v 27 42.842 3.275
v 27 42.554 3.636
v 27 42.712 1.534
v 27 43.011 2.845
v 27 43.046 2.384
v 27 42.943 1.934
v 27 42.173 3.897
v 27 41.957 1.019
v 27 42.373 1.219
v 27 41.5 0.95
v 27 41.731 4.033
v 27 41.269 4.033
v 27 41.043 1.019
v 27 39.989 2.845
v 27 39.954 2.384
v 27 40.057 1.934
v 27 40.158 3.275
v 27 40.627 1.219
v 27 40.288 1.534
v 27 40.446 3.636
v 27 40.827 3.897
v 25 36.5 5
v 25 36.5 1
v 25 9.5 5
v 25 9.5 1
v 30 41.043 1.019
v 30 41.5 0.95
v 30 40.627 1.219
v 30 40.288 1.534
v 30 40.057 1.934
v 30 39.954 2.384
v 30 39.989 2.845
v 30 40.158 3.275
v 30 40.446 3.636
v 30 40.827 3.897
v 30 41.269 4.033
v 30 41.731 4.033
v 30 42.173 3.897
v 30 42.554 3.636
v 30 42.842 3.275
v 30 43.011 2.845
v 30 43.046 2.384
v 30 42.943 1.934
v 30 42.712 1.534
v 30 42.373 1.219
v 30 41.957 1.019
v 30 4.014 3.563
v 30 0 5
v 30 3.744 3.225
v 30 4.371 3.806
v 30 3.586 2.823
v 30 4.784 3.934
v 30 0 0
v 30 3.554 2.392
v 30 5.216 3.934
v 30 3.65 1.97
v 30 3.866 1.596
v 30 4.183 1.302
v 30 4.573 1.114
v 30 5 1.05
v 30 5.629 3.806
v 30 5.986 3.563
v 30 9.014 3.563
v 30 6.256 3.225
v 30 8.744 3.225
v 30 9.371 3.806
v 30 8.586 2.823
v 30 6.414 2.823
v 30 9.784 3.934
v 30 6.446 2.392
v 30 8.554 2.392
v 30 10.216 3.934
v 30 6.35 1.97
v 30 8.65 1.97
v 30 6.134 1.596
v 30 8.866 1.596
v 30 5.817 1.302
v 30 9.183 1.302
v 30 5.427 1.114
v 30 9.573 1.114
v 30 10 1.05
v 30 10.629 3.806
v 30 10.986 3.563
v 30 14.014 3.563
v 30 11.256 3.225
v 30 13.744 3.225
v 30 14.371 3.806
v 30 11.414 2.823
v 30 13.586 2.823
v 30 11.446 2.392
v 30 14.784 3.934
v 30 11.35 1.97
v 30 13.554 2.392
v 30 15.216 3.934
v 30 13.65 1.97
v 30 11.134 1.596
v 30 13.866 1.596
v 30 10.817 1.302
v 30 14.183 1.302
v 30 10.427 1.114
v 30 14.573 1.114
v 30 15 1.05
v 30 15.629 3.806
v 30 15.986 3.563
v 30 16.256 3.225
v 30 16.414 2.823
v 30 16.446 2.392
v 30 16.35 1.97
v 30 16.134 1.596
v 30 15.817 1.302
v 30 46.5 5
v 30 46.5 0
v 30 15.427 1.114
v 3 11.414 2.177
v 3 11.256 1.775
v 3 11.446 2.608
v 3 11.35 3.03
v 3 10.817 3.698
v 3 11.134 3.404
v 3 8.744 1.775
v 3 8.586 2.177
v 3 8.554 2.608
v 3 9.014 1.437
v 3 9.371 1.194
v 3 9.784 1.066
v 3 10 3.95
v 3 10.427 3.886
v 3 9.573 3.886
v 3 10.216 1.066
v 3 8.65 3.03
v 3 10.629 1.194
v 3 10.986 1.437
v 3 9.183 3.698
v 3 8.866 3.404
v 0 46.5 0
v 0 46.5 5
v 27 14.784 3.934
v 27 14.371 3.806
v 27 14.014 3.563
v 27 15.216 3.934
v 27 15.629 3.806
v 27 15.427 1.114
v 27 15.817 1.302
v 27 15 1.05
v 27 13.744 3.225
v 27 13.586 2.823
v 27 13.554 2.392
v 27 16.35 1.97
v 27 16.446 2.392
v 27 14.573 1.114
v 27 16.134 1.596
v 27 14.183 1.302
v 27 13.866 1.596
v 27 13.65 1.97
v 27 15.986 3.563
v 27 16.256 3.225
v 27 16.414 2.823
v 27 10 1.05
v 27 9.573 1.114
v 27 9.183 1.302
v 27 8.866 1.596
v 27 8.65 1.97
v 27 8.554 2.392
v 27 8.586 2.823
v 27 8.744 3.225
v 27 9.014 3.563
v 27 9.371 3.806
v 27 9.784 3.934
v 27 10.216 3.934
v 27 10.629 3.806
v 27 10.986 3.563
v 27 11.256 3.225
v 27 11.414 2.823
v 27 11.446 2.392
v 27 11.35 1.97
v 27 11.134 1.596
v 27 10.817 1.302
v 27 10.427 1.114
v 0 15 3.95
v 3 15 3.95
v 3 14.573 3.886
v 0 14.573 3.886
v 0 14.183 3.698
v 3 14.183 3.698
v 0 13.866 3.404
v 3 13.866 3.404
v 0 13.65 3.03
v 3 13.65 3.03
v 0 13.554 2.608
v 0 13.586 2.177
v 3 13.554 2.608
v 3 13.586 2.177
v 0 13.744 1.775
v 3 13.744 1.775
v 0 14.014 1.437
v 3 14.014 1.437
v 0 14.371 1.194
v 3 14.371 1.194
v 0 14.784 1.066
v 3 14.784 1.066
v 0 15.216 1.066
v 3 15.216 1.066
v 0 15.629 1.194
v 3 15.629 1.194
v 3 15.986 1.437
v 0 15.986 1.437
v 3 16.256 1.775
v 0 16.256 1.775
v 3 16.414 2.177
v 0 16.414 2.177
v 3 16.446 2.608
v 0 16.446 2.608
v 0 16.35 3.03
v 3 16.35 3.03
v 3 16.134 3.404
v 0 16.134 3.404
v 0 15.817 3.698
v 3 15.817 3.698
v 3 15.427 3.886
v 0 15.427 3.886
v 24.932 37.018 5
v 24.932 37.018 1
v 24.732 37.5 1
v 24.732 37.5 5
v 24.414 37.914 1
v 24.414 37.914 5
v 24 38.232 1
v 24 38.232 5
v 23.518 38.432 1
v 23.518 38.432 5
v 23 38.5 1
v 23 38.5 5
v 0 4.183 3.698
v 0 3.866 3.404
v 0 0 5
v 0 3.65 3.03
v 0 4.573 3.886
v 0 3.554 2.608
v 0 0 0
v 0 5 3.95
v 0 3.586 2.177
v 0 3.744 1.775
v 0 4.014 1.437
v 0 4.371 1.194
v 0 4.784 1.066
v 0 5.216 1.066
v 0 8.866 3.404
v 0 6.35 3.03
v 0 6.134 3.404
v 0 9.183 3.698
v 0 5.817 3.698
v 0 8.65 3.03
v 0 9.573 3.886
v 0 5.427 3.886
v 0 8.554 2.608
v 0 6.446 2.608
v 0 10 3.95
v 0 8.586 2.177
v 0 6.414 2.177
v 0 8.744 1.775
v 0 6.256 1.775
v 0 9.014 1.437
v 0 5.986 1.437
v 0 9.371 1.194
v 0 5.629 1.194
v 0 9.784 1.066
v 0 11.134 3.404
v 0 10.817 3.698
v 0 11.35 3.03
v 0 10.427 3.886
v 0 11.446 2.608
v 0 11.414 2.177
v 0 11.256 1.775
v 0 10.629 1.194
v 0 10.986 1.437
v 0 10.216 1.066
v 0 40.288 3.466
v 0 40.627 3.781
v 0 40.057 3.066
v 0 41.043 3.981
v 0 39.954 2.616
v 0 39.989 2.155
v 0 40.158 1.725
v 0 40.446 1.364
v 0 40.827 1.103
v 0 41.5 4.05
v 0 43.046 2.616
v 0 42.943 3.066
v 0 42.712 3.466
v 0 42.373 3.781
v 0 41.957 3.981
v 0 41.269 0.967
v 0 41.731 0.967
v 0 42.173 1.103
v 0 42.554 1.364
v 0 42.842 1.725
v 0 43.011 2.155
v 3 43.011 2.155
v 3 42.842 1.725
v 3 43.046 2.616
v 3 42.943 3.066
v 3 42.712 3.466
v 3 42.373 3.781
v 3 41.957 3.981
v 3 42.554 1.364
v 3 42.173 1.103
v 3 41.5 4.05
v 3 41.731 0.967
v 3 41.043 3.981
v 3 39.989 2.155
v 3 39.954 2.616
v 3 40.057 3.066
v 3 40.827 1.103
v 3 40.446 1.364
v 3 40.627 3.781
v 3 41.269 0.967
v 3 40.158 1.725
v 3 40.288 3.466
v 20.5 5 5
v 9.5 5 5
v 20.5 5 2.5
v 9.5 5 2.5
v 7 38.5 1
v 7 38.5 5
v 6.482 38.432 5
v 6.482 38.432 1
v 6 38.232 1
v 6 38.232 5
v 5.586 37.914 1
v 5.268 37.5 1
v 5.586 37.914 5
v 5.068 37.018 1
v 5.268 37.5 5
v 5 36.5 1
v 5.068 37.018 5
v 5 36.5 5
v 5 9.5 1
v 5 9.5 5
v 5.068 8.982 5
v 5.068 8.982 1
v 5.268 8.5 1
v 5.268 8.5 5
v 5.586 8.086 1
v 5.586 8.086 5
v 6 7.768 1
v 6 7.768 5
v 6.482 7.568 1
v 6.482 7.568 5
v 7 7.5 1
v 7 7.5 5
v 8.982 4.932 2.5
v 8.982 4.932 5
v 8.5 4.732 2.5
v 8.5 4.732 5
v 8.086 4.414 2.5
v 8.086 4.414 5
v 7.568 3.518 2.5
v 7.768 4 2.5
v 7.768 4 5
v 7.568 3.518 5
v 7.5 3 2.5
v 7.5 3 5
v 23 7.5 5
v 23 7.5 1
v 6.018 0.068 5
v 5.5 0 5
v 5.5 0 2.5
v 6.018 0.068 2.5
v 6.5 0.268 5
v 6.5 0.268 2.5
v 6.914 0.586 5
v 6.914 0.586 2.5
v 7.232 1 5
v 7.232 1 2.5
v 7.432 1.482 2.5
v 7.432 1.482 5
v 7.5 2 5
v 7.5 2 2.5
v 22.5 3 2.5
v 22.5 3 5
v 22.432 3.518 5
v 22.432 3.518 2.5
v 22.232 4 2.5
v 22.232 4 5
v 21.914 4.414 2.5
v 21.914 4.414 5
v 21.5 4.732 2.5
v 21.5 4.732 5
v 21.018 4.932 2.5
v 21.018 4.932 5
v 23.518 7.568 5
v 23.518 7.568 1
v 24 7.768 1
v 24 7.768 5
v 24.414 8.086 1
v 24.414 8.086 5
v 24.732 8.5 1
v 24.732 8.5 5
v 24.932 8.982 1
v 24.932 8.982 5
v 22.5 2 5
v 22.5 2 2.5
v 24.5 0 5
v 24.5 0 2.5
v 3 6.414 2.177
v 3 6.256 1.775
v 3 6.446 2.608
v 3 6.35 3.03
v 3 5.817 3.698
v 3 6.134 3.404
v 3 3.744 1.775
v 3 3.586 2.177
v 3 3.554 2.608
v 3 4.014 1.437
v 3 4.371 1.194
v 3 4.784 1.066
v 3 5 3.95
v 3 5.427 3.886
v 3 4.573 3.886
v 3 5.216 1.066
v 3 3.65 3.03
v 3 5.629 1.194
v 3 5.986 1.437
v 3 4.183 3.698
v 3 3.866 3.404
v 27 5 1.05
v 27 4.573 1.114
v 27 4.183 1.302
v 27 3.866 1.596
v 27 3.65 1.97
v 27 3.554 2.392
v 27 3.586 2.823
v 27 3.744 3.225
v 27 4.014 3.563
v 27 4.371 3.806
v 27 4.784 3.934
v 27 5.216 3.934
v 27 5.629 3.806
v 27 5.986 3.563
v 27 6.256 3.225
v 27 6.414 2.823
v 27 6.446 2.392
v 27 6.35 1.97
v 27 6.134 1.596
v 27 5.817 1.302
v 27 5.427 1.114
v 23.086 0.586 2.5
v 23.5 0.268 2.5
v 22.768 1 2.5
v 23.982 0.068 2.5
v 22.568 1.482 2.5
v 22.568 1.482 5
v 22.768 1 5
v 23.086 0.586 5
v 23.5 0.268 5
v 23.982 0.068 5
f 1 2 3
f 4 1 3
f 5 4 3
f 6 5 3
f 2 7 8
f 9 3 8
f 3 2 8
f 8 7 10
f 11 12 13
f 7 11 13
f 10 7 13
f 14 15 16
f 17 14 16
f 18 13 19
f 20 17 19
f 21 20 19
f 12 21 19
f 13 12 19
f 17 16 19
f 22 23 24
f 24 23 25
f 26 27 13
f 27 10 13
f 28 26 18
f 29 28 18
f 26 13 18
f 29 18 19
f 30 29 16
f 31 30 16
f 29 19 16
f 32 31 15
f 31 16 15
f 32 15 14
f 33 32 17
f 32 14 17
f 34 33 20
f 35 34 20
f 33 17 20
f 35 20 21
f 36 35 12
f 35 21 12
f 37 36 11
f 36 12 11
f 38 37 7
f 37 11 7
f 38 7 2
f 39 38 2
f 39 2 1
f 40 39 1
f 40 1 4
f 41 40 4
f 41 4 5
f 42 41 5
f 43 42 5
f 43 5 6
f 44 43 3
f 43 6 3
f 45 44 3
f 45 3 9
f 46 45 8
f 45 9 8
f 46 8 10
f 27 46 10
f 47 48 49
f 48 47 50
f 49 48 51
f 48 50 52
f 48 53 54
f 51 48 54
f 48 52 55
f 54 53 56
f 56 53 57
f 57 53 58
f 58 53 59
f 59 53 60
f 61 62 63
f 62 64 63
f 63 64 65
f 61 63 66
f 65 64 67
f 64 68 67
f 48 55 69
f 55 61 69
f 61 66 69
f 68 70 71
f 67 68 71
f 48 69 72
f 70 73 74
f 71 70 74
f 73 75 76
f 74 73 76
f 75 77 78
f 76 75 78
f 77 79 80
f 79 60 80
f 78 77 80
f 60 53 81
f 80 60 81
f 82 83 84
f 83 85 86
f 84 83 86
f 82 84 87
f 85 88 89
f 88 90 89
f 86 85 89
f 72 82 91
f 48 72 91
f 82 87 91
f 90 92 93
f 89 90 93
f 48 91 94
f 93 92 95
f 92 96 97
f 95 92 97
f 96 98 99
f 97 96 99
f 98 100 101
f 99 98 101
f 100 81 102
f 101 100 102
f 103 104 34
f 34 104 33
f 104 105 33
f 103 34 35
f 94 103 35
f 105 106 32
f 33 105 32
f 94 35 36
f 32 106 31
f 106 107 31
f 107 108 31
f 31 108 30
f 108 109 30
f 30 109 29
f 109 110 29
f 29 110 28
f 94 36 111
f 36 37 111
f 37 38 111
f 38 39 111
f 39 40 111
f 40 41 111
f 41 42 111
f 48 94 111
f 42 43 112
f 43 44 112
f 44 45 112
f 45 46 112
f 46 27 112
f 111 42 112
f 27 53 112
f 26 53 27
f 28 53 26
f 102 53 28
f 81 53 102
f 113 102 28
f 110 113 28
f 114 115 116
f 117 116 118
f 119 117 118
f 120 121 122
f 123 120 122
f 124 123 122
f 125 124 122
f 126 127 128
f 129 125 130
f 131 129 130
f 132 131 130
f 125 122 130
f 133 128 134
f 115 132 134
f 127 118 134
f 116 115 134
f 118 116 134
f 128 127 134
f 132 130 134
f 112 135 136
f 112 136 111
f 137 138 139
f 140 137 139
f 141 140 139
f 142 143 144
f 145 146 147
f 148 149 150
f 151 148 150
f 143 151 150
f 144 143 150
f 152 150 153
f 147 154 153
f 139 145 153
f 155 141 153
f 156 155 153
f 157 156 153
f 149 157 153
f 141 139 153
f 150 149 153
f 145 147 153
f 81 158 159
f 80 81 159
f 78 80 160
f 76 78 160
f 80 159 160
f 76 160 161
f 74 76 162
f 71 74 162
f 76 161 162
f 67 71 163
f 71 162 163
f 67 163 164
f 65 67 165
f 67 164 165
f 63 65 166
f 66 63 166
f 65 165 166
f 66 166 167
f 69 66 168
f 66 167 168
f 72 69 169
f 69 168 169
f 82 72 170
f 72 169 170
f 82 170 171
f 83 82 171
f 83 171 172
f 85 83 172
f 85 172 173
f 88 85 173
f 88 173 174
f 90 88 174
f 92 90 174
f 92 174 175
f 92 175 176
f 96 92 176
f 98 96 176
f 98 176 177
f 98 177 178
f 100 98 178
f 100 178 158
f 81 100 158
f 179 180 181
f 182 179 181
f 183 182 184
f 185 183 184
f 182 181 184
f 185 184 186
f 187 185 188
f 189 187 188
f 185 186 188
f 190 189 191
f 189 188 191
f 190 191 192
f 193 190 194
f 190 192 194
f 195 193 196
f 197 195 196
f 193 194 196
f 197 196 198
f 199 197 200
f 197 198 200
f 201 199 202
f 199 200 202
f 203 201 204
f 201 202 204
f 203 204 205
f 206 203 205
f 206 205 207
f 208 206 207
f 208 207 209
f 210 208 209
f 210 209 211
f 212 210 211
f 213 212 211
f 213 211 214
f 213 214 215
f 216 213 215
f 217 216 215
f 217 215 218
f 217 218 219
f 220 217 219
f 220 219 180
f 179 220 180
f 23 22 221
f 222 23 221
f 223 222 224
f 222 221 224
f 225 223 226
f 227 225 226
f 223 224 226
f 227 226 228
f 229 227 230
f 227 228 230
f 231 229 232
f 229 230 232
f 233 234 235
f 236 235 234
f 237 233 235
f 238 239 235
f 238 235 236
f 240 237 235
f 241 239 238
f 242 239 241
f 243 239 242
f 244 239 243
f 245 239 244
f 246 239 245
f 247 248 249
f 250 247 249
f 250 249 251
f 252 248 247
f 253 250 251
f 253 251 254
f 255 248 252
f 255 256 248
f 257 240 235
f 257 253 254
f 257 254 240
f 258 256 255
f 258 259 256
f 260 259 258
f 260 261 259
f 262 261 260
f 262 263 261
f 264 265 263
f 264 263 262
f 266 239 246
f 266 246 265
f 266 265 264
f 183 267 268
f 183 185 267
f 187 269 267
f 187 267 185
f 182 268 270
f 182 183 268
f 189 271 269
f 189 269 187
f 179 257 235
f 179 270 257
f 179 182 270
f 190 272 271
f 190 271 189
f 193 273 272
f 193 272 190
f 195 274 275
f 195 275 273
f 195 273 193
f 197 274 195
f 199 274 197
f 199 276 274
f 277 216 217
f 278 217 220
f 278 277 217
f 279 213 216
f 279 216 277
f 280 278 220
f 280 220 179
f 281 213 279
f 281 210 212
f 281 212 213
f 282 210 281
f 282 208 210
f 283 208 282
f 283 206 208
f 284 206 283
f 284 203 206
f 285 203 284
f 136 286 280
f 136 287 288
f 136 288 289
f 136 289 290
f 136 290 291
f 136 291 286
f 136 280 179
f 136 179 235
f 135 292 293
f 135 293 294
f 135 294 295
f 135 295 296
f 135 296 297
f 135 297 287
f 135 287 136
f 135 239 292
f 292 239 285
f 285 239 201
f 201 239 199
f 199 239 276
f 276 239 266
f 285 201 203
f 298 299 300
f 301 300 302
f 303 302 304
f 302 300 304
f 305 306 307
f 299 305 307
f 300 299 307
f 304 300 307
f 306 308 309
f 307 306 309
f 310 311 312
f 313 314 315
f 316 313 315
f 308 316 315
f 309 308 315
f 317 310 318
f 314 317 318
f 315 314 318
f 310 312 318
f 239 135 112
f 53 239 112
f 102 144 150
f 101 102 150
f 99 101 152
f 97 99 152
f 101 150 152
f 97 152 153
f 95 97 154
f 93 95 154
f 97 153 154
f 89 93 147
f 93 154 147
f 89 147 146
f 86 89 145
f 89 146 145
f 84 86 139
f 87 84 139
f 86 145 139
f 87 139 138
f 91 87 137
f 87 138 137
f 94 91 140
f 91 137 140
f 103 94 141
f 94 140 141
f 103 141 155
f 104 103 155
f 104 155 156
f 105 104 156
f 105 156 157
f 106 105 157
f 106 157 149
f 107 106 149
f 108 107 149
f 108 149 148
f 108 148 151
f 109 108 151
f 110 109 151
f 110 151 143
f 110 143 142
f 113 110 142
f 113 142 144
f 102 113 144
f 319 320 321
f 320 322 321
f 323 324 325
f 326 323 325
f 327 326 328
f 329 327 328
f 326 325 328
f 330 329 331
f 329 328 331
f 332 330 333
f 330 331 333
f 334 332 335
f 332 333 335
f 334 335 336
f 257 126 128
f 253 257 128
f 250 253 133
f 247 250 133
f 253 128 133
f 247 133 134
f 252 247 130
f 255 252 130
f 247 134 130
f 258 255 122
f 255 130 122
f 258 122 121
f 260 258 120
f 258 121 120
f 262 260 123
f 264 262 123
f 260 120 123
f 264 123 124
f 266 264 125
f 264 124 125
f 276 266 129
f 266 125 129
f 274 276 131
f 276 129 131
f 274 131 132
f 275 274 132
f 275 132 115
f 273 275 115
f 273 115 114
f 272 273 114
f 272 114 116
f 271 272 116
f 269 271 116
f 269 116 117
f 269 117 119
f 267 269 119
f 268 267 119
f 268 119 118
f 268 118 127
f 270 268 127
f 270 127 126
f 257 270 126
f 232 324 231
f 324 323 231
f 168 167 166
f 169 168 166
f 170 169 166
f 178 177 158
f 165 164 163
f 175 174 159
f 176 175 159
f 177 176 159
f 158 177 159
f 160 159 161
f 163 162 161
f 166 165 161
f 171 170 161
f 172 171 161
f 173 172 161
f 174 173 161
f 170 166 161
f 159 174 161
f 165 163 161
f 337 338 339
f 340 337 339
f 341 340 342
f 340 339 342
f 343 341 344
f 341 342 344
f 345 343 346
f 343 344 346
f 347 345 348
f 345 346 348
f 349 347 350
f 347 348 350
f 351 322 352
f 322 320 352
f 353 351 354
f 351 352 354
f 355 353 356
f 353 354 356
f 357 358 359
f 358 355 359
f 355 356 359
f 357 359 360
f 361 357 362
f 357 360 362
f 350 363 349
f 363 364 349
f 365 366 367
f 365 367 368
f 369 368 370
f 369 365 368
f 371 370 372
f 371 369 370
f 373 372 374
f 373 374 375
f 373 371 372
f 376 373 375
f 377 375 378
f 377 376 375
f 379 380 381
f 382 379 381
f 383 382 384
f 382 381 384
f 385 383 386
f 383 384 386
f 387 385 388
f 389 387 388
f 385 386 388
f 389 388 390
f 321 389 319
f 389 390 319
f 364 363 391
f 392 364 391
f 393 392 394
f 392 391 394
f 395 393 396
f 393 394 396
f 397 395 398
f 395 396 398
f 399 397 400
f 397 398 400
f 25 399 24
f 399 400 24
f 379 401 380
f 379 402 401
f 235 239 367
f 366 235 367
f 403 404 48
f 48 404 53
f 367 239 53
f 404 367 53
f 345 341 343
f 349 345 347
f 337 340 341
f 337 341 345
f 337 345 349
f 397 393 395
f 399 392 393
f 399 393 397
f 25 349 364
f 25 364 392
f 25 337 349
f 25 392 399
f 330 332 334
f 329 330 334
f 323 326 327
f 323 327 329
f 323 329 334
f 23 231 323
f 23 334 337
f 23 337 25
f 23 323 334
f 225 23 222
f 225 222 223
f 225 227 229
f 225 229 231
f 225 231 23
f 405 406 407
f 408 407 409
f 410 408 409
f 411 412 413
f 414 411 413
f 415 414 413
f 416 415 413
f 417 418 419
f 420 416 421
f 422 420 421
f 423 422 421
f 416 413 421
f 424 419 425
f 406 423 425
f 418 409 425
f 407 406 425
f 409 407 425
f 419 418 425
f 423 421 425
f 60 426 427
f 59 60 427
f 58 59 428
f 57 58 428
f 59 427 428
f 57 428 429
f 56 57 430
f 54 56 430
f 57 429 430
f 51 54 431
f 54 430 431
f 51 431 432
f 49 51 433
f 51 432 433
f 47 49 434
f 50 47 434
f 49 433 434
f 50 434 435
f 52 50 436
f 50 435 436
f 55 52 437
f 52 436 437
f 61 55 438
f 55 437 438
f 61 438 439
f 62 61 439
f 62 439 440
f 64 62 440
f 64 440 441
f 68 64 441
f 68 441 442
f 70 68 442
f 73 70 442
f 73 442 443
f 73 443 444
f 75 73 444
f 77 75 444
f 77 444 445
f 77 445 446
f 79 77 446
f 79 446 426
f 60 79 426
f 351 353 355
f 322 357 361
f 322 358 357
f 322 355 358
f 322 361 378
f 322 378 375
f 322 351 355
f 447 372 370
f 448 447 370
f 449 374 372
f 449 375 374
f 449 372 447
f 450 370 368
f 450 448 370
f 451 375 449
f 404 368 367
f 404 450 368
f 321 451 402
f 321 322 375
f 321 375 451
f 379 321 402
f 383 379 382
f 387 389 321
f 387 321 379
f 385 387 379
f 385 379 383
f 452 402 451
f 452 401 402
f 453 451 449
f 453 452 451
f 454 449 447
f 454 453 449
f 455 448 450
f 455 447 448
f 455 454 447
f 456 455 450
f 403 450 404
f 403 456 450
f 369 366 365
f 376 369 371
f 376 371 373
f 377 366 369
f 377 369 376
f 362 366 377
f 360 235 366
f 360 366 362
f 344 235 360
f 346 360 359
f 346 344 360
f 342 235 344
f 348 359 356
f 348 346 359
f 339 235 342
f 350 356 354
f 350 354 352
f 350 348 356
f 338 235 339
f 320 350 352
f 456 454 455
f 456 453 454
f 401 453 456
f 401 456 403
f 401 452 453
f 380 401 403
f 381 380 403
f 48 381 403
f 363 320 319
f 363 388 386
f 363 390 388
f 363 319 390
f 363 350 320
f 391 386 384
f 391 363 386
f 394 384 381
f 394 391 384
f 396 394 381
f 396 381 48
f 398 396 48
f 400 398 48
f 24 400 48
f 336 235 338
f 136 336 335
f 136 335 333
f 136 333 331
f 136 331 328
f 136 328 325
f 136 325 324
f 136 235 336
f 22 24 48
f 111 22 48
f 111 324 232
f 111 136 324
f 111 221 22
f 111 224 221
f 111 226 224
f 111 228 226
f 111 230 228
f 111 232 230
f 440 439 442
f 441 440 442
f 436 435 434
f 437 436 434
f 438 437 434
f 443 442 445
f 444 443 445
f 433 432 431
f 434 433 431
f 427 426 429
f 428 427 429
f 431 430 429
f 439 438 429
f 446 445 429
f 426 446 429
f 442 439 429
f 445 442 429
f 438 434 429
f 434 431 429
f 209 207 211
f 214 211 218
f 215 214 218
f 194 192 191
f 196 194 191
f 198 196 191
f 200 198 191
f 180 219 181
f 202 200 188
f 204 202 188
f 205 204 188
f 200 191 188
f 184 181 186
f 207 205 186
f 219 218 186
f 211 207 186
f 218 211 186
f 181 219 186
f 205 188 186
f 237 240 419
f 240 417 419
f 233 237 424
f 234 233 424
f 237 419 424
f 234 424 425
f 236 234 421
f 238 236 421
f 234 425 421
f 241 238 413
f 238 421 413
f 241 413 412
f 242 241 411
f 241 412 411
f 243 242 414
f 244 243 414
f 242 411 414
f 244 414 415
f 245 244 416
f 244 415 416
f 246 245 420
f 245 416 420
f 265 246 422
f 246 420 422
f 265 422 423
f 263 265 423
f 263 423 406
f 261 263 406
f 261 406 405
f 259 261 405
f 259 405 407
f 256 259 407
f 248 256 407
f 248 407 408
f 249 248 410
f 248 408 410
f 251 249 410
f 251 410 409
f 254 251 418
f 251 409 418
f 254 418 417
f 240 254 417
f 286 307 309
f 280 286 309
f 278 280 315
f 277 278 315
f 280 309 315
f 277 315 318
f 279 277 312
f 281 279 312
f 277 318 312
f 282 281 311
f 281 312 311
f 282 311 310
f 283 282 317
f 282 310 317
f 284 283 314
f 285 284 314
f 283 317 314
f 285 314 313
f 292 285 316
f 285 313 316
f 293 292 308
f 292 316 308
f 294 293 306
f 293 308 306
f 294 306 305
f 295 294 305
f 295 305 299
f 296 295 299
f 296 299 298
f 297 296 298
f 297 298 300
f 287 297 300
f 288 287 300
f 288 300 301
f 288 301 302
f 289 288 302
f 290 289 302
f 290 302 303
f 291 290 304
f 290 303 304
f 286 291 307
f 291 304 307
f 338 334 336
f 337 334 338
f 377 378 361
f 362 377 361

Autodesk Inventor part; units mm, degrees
ref_plane "YZ Plane" through (0, 0, 0) normal (1, 0, 0) x (0, 1, 0)
ref_plane "XZ Plane" through (0, 0, 0) normal (0, 1, 0) x (-1, 0, 0)
ref_plane "XY Plane" through (0, 0, 0) normal (0, 0, 1) x (1, 0, 0)
sketch "スケッチ1" plane through (0, 0, 0) normal (0, 0, 1) x (1, 0, 0)
  line L0 (0, 46.5) -> (30, 46.5)
  line L1 (0, 0) -> (30, 0)
  line L2 (0, 0) -> (0, 46.5)
  line L3 (30, 0) -> (30, 46.5)
  line L4 (7.5, 0) -> (7.5, 5)
  line L5 (7.5, 5) -> (22.5, 5)
  line L6 (15, 0) -> (15, 46.5) construction
  line L7 (22.5, 0) -> (22.5, 5)
  line L8 (5, 38.5) -> (25, 38.5)
  line L9 (25, 38.5) -> (25, 7.5)
  line L10 (25, 7.5) -> (5, 7.5)
  line L11 (5, 38.5) -> (5, 7.5)
  point P0 (22.5, 0)
  dimension "d2" = 30
  dimension "d38" = 46.5
  dimension "d61" = 15
  dimension "d62" = 5
  dimension "d66" = 5
  dimension "d67" = 8
  dimension "d68" = 2.5
extrude "押し出し1" add sketch "スケッチ1" along normal blind 5 contours L0 L3 L1 L7 L5 L4 L2
sketch "スケッチ4" plane through (30, 0, 0) normal (1, 0, 0) x (0, 0, -1)
  line L0 (0, 46.5) -> (-5, 46.5) projected
  line L1 (-2.5, 46.5) -> (-2.5, 0) construction
  line L2 (0, 0) -> (-5, 0) projected
  point P0 (0, 0)
  point P1 (-2.5, 41.5)
  point P2 (-2.5, 5)
  point P3 (-2.5, 10)
  point P4 (-2.5, 15)
  dimension "d22" = 5
  dimension "d40" = 5
  dimension "d41" = 5
  dimension "d42" = 5
  dimension "d60" = 26.5
hole "穴1" at (30, 41.5, 2.5) direction (-1, 0, 0) diameter 3.1 depth 3
sketch "スケッチ5" plane through (0, 0, 0) normal (-1, 0, 0) x (0, 0, 1)
  circle A0 centre (2.5, 41.5) radius 1.55 projected
  line L0 (0, 0) -> (5, 0) projected
  line L1 (2.5, 0) -> (2.5, 46.5) construction
  line L2 (0, 46.5) -> (5, 46.5) projected
  point P0 (2.5, 5)
  point P1 (2.5, 10)
  point P2 (2.5, 15)
  point P3 (4.05, 32)
  point P4 (0.95, 32)
  dimension "d50" = 5
  dimension "d51" = 5
  dimension "d52" = 5
hole "穴2" at (0, 41.5, 2.5) direction (1, 0, 0) diameter 3.1 depth 3
hole "穴5" at (30, 5, 2.5) at (30, 15, 2.5) at (30, 10, 2.5) direction (-1, 0, 0) diameter 2.9 depth 3
hole "穴6" at (0, 5, 2.5) at (0, 10, 2.5) at (0, 15, 2.5) direction (1, 0, 0) diameter 2.9 depth 3
extrude "押し出し2" add sketch "スケッチ1" along normal blind 2.5 contours L4 L5 L7 L1
fillet "フィレット3" radius 2 8 edges at (7.5, 5, 3.75) (7.5, 0, 3.75) (22.5, 5, 3.75) (22.5, 0, 3.75) (5, 38.5, 2.5) (25, 38.5, 2.5) (5, 7.5, 2.5) (25, 7.5, 2.5)
extrude "押し出し3" add sketch "スケッチ1" along normal blind 1 contours L8 L9 L10 L11
equation "\"d41\" = d42"
equation "\"d51\" = d41"
equation "\"d52\" = d42"
properties part number "Cockpit_lower_back_door" material "アセタール樹脂、黒"
